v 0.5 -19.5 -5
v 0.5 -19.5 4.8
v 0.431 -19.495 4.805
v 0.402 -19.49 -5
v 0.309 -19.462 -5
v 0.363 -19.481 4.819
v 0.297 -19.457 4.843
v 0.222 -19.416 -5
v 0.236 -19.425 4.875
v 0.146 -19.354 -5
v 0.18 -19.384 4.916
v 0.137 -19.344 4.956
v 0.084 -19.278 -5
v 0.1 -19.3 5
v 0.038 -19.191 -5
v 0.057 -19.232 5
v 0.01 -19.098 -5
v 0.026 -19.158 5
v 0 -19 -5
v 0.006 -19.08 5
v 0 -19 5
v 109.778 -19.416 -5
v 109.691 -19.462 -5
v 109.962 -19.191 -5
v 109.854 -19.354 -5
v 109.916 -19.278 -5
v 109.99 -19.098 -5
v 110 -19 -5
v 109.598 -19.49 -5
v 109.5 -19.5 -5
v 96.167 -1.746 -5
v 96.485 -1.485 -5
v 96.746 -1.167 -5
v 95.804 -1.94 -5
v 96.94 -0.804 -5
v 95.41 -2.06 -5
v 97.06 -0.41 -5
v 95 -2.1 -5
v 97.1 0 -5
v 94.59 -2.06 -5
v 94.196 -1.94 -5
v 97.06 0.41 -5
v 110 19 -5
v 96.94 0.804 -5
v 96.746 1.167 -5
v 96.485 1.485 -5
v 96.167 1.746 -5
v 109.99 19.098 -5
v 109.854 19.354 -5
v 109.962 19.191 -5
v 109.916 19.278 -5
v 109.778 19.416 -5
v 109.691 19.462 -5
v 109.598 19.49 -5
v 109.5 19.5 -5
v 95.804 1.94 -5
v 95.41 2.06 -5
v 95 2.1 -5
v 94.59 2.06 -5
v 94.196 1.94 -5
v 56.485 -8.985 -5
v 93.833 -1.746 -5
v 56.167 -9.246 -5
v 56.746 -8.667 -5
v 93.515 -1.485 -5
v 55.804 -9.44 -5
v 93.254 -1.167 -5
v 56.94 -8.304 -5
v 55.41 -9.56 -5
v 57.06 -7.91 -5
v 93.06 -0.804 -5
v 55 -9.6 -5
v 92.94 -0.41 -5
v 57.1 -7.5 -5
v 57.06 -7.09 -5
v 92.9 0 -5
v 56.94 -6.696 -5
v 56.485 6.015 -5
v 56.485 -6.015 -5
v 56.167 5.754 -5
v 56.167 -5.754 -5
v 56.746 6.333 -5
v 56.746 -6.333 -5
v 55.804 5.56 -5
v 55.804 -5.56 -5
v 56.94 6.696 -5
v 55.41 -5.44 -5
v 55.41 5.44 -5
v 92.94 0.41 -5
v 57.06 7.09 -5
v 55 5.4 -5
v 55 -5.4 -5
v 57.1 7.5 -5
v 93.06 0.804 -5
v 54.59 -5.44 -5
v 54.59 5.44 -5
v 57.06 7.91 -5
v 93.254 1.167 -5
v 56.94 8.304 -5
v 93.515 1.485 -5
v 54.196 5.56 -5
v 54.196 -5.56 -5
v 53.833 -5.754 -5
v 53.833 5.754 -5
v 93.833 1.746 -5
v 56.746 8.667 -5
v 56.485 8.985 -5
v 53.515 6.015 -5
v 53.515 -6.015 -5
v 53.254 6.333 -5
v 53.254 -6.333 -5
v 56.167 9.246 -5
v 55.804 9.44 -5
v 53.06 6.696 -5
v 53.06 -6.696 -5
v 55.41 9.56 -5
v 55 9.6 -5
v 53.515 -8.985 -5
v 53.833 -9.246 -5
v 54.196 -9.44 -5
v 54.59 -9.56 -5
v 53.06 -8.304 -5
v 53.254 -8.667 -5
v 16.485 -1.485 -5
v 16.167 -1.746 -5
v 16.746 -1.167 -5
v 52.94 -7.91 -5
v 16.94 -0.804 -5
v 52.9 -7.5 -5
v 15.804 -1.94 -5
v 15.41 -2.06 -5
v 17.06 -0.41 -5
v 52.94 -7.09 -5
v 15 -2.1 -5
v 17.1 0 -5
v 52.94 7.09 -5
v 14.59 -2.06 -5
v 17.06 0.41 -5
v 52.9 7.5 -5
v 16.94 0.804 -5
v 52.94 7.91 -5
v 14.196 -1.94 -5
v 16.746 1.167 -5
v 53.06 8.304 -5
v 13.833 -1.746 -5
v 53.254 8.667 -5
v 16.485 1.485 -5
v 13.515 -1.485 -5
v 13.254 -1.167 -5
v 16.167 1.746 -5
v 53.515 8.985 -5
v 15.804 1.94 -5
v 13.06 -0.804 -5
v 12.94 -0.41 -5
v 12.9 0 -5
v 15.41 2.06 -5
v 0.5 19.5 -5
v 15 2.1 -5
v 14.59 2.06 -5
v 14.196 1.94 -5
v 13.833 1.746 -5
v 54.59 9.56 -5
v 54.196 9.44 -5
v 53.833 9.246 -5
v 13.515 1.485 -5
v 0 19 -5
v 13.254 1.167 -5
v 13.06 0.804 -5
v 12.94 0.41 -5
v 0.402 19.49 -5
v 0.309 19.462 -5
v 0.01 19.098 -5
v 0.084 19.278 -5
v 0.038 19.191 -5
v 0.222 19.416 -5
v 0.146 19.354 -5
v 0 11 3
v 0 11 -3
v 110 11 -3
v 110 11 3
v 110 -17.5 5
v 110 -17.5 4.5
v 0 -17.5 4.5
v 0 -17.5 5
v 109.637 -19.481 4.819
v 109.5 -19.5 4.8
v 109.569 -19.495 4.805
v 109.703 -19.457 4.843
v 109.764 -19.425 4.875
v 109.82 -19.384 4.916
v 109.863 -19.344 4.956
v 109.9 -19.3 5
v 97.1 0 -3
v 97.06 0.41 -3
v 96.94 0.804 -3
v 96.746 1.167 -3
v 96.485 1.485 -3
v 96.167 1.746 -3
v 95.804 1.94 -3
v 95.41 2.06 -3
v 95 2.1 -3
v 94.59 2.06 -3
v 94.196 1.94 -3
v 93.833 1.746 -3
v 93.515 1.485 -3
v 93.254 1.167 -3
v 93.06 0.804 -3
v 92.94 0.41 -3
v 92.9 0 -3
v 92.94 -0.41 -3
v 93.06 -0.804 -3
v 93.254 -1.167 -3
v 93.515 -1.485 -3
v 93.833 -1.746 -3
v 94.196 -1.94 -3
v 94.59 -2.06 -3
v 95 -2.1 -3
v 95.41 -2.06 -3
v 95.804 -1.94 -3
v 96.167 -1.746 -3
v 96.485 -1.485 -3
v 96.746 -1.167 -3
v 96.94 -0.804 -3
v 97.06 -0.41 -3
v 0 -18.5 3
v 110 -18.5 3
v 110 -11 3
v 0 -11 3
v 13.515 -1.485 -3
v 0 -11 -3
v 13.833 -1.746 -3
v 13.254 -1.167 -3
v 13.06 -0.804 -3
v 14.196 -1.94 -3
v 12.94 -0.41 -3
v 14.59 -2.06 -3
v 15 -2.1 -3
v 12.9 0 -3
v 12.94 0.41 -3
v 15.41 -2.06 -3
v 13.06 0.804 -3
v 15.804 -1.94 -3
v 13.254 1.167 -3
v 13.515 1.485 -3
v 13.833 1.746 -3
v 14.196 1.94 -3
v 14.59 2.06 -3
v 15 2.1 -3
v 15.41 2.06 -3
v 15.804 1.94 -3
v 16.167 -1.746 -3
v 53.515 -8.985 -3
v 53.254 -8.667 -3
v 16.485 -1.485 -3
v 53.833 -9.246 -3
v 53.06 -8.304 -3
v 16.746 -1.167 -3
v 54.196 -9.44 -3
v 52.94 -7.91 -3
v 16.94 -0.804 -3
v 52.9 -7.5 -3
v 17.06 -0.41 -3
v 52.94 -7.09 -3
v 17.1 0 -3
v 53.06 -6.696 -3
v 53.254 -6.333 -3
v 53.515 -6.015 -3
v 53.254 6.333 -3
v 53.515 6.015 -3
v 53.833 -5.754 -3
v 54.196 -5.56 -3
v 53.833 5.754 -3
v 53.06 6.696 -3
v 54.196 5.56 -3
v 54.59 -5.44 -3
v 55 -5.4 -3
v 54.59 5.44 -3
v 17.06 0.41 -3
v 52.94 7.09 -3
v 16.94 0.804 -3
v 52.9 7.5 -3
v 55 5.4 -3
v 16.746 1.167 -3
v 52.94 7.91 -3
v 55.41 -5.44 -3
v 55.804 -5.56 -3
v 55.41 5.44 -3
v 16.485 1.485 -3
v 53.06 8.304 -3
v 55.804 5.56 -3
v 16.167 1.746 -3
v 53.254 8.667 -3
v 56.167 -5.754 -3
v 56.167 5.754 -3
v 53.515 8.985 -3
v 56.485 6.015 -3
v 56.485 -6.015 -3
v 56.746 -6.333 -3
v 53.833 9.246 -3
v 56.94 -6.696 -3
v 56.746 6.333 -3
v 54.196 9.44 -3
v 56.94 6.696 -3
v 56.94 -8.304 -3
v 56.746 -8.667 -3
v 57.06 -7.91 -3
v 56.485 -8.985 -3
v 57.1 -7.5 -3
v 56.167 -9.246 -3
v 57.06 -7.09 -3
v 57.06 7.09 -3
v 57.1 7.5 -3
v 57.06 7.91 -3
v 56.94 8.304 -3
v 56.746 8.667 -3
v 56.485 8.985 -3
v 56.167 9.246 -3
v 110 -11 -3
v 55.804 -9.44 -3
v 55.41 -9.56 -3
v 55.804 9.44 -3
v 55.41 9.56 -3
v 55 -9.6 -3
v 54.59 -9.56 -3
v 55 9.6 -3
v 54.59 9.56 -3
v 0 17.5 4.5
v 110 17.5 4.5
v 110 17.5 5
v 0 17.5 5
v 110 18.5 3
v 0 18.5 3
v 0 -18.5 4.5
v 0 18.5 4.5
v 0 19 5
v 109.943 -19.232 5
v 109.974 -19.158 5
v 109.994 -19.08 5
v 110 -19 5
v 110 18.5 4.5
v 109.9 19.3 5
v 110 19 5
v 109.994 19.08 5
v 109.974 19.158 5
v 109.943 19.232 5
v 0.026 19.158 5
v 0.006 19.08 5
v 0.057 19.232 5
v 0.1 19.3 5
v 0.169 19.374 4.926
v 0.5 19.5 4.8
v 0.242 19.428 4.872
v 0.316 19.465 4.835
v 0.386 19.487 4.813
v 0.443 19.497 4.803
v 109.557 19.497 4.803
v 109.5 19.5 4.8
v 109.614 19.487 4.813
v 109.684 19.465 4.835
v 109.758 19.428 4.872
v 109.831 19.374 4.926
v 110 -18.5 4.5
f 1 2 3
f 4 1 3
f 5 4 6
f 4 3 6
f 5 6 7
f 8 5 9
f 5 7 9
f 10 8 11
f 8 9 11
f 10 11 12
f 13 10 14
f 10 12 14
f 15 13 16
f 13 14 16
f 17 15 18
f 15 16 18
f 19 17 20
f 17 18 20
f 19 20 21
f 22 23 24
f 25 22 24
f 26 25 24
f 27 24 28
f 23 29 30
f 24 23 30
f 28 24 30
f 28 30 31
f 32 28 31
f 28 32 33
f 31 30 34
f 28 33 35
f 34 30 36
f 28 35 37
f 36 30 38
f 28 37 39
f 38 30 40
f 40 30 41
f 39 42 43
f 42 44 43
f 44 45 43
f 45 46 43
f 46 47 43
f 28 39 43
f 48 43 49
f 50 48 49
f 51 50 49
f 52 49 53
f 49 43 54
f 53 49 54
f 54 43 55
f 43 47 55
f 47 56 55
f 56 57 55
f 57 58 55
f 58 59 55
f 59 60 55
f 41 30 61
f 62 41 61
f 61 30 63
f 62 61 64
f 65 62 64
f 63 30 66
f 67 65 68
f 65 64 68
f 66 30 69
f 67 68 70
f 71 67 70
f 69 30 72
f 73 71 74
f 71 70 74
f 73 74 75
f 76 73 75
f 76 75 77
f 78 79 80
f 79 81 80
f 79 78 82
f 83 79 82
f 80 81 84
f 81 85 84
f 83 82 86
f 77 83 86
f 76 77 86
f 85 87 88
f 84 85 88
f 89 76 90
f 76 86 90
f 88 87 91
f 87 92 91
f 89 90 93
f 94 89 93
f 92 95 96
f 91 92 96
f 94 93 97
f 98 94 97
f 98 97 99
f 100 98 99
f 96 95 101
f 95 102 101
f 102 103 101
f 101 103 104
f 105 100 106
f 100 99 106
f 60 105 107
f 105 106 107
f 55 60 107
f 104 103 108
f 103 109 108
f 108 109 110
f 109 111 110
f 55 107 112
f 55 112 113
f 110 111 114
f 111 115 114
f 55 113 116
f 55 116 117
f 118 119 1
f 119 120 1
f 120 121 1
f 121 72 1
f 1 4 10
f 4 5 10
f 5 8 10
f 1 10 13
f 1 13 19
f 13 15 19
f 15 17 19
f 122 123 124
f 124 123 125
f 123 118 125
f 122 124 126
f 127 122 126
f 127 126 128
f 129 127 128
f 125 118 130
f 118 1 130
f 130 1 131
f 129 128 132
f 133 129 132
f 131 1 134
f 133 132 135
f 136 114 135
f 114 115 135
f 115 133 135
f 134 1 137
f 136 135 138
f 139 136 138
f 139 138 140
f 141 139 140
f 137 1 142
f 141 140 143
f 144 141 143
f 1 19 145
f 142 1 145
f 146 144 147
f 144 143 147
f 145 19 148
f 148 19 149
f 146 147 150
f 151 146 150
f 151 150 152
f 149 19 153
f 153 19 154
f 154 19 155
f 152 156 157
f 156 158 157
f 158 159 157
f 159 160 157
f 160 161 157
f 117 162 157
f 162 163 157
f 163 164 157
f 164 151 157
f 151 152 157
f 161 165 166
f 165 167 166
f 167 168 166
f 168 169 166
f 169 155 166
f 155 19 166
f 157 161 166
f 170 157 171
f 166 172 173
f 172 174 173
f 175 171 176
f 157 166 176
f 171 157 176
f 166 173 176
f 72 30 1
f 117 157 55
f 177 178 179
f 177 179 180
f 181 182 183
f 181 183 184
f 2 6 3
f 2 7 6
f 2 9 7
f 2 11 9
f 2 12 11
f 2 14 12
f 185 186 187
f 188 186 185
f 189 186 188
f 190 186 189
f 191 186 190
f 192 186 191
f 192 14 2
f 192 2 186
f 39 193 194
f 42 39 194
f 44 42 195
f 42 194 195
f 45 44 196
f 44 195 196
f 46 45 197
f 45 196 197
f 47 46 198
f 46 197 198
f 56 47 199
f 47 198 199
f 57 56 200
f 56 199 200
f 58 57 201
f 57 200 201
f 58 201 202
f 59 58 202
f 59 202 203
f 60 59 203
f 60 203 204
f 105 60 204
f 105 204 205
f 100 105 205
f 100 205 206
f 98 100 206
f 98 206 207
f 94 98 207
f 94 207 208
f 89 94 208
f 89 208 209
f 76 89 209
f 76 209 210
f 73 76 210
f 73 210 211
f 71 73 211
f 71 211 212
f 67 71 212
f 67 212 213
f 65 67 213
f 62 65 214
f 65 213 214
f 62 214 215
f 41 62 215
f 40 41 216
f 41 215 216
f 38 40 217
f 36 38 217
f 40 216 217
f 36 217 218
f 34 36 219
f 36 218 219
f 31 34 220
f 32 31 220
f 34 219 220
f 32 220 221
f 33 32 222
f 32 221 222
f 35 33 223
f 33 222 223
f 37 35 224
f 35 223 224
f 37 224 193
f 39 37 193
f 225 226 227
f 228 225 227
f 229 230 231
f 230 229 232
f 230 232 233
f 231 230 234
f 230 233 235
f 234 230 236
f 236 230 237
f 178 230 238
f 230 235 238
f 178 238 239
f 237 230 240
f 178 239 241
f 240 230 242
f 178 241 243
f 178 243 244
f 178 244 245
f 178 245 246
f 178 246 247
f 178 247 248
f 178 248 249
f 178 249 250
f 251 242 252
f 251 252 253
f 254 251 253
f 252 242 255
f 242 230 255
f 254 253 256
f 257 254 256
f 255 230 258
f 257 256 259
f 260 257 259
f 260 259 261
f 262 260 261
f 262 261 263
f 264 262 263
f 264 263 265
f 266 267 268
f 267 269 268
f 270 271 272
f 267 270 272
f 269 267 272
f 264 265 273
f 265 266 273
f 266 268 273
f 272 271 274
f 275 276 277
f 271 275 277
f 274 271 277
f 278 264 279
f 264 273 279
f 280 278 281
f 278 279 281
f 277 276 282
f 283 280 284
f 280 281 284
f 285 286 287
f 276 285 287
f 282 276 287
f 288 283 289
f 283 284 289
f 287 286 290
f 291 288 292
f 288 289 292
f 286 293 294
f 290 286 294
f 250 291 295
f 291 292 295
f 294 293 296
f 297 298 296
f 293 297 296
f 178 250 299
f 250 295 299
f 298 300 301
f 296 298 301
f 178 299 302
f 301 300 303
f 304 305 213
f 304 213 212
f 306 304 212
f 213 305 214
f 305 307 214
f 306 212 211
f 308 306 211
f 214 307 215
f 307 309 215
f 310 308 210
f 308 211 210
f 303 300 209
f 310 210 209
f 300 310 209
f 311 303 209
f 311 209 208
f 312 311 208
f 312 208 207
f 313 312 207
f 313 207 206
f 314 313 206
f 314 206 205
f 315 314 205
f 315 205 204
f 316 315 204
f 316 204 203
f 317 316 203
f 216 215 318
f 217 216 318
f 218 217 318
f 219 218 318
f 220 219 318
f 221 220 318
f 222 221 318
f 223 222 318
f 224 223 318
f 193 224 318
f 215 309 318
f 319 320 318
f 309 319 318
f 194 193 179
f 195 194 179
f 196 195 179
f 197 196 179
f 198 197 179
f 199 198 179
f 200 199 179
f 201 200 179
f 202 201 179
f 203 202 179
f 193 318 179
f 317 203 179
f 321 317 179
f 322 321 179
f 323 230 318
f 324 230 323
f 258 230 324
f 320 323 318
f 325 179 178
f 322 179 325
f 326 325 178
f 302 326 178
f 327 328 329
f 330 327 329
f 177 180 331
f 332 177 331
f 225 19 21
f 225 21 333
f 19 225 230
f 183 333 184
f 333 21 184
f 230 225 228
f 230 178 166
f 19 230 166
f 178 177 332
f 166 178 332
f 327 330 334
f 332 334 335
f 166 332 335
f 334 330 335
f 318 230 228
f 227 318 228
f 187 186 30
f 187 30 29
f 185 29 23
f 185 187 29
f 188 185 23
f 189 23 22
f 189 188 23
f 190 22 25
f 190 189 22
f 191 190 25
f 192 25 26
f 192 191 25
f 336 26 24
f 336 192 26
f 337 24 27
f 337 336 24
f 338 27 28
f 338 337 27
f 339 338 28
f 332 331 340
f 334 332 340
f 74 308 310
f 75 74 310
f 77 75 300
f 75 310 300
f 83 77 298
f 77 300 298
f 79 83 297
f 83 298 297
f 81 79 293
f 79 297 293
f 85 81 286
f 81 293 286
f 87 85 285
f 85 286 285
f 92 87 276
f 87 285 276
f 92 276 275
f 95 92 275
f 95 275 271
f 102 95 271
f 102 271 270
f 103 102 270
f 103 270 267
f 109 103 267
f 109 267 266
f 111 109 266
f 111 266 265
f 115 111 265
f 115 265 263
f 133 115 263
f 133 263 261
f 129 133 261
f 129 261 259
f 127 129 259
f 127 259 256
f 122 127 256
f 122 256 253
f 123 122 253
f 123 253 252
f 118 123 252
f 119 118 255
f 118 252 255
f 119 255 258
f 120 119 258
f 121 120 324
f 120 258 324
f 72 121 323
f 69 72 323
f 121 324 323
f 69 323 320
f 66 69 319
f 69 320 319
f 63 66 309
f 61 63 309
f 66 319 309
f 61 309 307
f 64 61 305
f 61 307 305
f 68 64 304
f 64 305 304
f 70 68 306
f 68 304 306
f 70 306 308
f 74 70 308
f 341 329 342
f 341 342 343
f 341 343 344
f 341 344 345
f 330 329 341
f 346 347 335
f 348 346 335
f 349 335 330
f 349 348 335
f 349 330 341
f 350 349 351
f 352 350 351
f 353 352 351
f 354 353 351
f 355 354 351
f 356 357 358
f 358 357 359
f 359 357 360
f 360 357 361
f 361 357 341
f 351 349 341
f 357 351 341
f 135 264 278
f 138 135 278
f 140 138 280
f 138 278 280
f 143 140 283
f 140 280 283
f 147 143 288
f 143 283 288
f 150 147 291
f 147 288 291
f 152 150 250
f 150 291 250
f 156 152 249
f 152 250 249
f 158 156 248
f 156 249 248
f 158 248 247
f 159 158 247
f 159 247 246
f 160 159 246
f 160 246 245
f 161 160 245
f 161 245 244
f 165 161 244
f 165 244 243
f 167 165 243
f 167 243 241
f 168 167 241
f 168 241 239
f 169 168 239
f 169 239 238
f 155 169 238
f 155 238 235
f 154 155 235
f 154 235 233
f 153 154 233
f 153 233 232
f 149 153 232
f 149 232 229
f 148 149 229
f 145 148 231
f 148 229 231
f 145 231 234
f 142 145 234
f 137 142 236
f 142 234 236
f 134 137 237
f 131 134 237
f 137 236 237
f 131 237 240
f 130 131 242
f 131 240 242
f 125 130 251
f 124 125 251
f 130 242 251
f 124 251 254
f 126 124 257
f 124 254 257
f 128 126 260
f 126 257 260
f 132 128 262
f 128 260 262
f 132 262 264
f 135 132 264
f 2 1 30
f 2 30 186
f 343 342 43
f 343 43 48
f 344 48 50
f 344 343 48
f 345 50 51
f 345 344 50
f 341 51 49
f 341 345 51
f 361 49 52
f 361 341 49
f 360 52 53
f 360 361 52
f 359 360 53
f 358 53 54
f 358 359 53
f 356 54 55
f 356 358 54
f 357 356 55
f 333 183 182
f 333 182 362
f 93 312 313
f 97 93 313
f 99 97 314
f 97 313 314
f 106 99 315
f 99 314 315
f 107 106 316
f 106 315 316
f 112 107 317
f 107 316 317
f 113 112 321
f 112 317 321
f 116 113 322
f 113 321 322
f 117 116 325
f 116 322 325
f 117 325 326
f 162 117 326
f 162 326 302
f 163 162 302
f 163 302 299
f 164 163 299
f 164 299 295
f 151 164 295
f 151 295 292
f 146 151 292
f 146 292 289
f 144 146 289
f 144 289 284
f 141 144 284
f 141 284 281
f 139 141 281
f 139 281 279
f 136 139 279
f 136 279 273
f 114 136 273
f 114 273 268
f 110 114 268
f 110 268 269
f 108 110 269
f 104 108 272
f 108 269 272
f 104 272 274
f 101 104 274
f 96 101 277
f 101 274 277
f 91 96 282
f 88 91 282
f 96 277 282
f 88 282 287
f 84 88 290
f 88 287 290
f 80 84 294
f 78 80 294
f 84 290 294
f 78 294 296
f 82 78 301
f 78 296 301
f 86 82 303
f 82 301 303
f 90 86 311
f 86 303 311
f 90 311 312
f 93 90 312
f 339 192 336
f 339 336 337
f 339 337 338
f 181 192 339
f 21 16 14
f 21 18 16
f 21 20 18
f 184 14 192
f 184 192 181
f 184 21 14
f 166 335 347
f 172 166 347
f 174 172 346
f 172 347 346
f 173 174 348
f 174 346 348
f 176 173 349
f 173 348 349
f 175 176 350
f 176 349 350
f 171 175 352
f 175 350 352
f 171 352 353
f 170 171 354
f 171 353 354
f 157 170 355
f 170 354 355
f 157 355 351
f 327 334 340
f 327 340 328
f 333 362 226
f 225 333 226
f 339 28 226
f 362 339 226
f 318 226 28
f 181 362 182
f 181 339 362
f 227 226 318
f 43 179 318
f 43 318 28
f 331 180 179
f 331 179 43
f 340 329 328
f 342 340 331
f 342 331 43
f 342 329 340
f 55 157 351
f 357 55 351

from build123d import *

# Parameters (mm, degrees)
F0_W     = 39
F0_H     = 10
F1_DEPTH = 110
F2_W     = 35
F2_H     = 1
F3_DEPTH = 110
F5_DEPTH = 110
F6_W     = 22
F6_H     = 12
F7_DEPTH = 110
F8_R     = 2.1
F9_DEPTH = 25
F10_SIZE = 0.2
F11_R    = 0.5


with BuildPart() as f1:
    # F0 (on Right) → F1 (new body)
    with BuildSketch(Plane.YZ):
        Rectangle(F0_W, F0_H)
    extrude(amount=F1_DEPTH)

    # F2 (on face) → F3 (cut)
    with BuildSketch(Plane.YZ.offset(110)):
        with Locations((0, 5)):
            Rectangle(F2_W, F2_H)
    extrude(amount=-F3_DEPTH, mode=Mode.SUBTRACT)

    # F4 (on face) → F5 (cut)
    with BuildSketch(Plane.YZ.offset(110)):
        Polygon((-18.5, 3), (18.5, 3), (18.5, 4.5), (17.5, 4.5), (17.5, 5.544198), (-17.5, 5.544198), (-17.5, 4.5), (-18.5, 4.5), align=None)
    extrude(amount=-F5_DEPTH, mode=Mode.SUBTRACT)

    # F6 (on face) → F7 (cut)
    with BuildSketch(Plane.YZ.offset(110)):
        with Locations((0, 3)):
            Rectangle(F6_W, F6_H)
    extrude(amount=-F7_DEPTH, mode=Mode.SUBTRACT)

    # F8 (on face) → F9 (cut)
    with BuildSketch(Plane.XY.offset(-3)):
        with Locations((15, 0)):
            Circle(F8_R)
        with Locations((95, 0)):
            Circle(F8_R)
        with Locations((55, -7.5)):
            Circle(F8_R)
        with Locations((55, 7.5)):
            Circle(F8_R)
    extrude(amount=-F9_DEPTH, mode=Mode.SUBTRACT)

    # F10
    f10_edges = [f1.edges().sort_by_distance(p)[0] for p in [
        (55, -19.5, 5),
        (55, 19.5, 5),
    ]]
    chamfer(f10_edges, length=F10_SIZE)

    # F11
    f11_edges = [f1.edges().sort_by_distance(p)[0] for p in [
        (0, -19.5, -0.1),
        (0, 19.5, -0.1),
        (110, -19.5, -0.1),
        (110, 19.5, -0.1),
    ]]
    fillet(f11_edges, radius=F11_R)


solid = f1.part
